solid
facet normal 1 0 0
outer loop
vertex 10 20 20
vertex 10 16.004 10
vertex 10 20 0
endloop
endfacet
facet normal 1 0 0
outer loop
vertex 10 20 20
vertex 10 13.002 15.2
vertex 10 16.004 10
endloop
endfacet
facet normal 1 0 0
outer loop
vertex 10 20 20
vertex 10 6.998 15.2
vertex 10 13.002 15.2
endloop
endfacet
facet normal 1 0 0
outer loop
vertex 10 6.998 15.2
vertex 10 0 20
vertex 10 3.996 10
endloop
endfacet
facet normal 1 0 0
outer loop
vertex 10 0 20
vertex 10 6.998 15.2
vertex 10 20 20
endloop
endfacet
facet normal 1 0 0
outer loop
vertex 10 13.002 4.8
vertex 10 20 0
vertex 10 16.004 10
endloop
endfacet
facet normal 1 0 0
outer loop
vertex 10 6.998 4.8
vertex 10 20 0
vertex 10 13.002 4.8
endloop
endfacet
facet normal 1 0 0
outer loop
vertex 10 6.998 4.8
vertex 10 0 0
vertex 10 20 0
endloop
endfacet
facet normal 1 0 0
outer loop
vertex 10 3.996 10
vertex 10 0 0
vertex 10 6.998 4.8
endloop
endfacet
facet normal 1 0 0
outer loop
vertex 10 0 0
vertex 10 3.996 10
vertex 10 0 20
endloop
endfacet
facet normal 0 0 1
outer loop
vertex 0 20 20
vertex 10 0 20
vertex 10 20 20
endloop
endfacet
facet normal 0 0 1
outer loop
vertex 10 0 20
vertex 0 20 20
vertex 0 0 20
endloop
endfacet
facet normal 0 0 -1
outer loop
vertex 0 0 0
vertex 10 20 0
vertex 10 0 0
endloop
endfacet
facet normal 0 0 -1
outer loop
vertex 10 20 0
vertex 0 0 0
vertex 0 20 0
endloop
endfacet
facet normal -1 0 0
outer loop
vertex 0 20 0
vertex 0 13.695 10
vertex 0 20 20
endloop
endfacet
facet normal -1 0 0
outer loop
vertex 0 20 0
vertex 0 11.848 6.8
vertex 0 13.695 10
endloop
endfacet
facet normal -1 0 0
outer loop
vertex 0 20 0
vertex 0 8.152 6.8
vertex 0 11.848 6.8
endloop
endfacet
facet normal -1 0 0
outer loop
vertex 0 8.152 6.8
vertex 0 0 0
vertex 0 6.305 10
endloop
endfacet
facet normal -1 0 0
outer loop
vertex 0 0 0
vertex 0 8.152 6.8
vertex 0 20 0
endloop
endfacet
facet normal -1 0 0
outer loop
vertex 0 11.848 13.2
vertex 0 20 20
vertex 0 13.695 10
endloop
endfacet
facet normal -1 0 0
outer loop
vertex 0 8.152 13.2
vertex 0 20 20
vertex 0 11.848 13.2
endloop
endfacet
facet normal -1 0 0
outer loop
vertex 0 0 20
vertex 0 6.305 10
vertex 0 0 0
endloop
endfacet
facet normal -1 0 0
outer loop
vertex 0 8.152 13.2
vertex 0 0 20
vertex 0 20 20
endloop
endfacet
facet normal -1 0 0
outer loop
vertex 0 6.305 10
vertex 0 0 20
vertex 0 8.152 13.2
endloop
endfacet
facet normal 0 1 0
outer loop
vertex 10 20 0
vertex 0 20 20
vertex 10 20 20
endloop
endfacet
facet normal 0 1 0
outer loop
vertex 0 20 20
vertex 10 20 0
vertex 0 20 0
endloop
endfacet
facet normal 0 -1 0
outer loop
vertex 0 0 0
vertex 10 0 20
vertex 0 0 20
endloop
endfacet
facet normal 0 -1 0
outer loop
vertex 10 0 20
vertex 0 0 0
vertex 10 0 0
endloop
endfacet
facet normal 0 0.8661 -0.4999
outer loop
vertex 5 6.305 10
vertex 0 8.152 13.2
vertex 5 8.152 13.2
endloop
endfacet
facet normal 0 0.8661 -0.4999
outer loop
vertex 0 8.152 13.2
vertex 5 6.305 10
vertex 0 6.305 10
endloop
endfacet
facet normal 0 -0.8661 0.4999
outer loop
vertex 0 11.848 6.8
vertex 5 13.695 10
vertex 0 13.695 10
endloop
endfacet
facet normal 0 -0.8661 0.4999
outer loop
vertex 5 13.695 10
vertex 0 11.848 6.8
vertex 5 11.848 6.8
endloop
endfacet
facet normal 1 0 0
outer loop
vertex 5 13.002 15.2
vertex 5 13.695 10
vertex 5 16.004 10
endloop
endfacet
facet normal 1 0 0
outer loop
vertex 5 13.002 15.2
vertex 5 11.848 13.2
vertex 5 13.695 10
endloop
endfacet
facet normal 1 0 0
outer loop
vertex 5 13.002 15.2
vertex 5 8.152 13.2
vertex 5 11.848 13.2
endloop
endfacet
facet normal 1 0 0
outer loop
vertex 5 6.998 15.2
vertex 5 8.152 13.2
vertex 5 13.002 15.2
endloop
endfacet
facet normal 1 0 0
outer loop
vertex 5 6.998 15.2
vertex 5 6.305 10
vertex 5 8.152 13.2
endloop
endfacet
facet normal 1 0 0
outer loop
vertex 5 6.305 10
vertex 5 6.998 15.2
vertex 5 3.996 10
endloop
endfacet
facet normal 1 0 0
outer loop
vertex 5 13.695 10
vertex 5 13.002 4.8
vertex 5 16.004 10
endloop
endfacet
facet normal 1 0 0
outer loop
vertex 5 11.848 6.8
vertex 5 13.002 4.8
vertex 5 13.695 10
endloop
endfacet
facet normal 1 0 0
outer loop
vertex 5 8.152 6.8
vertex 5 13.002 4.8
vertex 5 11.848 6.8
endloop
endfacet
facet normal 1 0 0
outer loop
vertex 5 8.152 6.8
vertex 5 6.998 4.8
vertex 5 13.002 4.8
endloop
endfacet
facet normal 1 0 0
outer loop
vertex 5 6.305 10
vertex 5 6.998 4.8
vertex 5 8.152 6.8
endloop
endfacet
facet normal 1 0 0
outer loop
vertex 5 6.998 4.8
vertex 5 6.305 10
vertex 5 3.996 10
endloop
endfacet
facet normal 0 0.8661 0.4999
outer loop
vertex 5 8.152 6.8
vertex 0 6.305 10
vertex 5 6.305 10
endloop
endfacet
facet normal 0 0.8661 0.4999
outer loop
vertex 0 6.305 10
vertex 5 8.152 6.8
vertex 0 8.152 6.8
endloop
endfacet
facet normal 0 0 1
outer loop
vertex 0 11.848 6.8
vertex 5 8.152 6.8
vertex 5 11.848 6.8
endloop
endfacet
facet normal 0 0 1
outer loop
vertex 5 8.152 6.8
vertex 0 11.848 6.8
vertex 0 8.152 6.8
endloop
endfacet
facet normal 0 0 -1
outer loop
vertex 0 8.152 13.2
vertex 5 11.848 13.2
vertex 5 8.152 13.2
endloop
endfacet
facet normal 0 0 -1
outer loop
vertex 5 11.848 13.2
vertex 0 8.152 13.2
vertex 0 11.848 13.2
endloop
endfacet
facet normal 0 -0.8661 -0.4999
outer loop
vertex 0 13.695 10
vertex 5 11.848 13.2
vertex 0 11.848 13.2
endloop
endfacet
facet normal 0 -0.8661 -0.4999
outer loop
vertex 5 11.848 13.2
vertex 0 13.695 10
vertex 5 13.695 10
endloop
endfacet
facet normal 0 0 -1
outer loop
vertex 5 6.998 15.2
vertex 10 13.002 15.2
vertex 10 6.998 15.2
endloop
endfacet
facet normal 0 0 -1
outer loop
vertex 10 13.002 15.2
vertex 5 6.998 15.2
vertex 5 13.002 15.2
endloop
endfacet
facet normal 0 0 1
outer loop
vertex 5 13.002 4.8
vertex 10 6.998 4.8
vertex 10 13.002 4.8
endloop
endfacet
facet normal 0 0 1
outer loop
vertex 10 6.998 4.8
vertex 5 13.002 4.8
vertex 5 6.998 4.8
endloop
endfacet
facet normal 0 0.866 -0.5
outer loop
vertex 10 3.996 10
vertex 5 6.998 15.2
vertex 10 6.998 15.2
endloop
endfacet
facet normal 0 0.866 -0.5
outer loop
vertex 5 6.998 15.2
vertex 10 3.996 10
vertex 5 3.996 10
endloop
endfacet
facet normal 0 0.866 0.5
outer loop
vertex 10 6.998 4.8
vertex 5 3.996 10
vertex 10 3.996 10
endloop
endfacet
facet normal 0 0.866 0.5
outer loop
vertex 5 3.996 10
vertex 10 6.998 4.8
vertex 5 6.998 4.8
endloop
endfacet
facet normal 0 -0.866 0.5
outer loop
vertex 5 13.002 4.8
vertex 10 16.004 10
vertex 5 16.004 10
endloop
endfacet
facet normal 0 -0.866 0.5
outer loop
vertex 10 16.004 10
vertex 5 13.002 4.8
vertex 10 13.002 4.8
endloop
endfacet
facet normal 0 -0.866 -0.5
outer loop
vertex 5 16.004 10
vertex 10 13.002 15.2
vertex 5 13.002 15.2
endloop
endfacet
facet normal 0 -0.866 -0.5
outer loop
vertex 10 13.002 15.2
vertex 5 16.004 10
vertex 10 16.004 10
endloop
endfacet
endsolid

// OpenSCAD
// file: ../../../modules/steel_rack.scad
use <bolts.scad>;

bolt_edge_offset = 15;
bolt_positions = [
  bolt_edge_offset,
  bolt_edge_offset + 98,
  bolt_edge_offset + 98 + 24,
];

module bolt_and_nut(y, h) {
  nut_thickness = 5;
  translate([0, y, h / 2])
    m6_bolt_hole(h + 1, center = true);
  translate([0, y, h - nut_thickness / 2])
    rotate([0, 0, 90])
    m6_nut_trap(nut_thickness, center = true);
}

module long_bar(w, y, h) {
  difference() {
    translate([w / 2, y / 2, h / 2])
      cube([w, y, h], center = true);

    for (x = bolt_positions) {
      translate([x, 0, 0])
        bolt_and_nut(y / 2, h);
    }
  }
}

module short_bar(w, y, h) {
  difference() {
    translate([w / 2, y / 2, h / 2])
      cube([w, y, h], center = true);

    translate([bolt_positions[0], 0, 0])
      bolt_and_nut(y / 2, h);
  }
}

module fillet_profile(r, h) {
  linear_extrude(height = h, center = true)
    difference() {
      square([r, r]);
      circle(r = r, $fn = 64);
    }
}
// file: ../../../modules/bolts.scad
module nut_trap(d, h, center = true) {
  linear_extrude(height = h, center = center)
  circle(d = d / cos(30), $fn = 6);
}

module bolt_hole(d, h, center = true) {
  linear_extrude(height = h, center = center)
  circle(d = d, $fn = 64);
}

// Hex holes for self-tapping (nominal - 0.2mm)
module hex_hole(flat_d, h) {
  linear_extrude(height = h, center = true)
  circle(d = flat_d / cos(30), $fn = 6);
}

module m3_bolt_hexhole(h) {
  rotate([0, 0, 90]) hex_hole(flat_d = 2.8, h = h);
}

module m4_bolt_hexhole(h) {
  rotate([0, 0, 90]) hex_hole(flat_d = 3.8, h = h);
}

module m6_bolt_hexhole(h) {
  rotate([0, 0, 90]) hex_hole(flat_d = 5.8, h = h);
}

module m8_bolt_hexhole(h) {
  rotate([0, 0, 90]) hex_hole(flat_d = 7.8, h = h);
}

// M3
module m3_bolt_hole(h, center = false) { bolt_hole(d = 3.4, h = h, center = center); }
module m3_nut_trap(h, center = false) { nut_trap(d = 5.7, h = h, center = center); }

// M4
module m4_bolt_hole(h, center = false) { bolt_hole(d = 4.4, h = h, center = center); }
module m4_nut_trap(h, center = false) { nut_trap(d = 7.5, h = h, center = center); }

// M6
module m6_bolt_hole(h, center = false) { bolt_hole(d = 6.2, h = h, center = center); }
module m6_nut_trap(h, center = false) { nut_trap(d = 10.2, h = h, center = center); }

// M8
module m8_bolt_hole(h, center = false) { bolt_hole(d = 8.4, h = h, center = center); }
module m8_nut_trap(h, center = false) { nut_trap(d = 13.3, h = h, center = center); }
// file: ../../../modules/slide_rail_outer_bracket.scad
use <bolts.scad>
use <steel_rack.scad>

// スライドレール外側とL字アングルを接合するL字ブラケット。
// 設計の経緯と確定値は ledger/designs/steel-rack-500x400.md が正本。
//
// 座標系 (部品自身の datum):
//   X = 0 がこの部品側のL字アングル外側面。部品はアングル板厚の内側から始まる
//   Y = 0 がスライドレール外側面。+Y がラック外側
//   Z = 0 が部品底面 (レール下端と一致)
// front は screw_x = [37, 101.5]、rear は [76.5, 172.5] を自分の datum
// から渡す。 M6 が高さ 22.5±12 の対称配置のため部品は Z 反転対称になり、
// 左右のレールにも上下反転するだけで同じ2部品を使い回せる。

bracket_height = 45;
flange_t = 10;
inner_r = 4;
m6_z = [ 10.5, 34.5 ];
// クリアランス基準: 呼び寸法 + 0.4mm (実プリントの嵌合結果から拡大)
m6_pass_flat = 6.4; // M6ボルト通し六角の二面幅 (手前5mm)
m6_nut_flat = 10.4; // M6ナット窪み六角の二面幅 (奥5mm、ナット実測10.0)
m6_stage_depth = 5;
screw_z = 22.5;
m4_pass_flat = 4.4; // M4小トラスネジ通し六角の二面幅
m4_nut_flat = 7.4; // M4ナット窪み六角の二面幅 (JIS規格7.0 + 0.4、実測は未)
m4_nut_depth = 2.8; // M4ナット窪みの深さ (user指定)
edge_margin = 8; // 穴の外縁から部品端までの余白 (自由な辺のみ)
angle_t = 2.2; // L字アングルの板厚

// 六角プリズム: 軸X・上下の辺が水平 (flat-up)。
// 天井を短い水平ブリッジにして垂れの改善を狙う
// (point-up だと天井面が水平から30°になり垂れた — 嵌合試験で確認済み)
module
hex_x_flat_up(flat_d, l)
{
    rotate([ 0, 90, 0 ]) rotate([ 0, 0, 90 ]) hex_hole(flat_d = flat_d, h = l);
}

// 六角プリズム: 軸Y・上下の辺が水平 (flat-up)。M6と同じくブリッジ天井
module
hex_y_flat_up(flat_d, l)
{
    rotate([ 90, 0, 0 ]) hex_hole(flat_d = flat_d, h = l);
}

module
slide_rail_outer_bracket(screw_x, name = "bracket")
{
    // flat-up配置では水平方向の穴半径は対角/2 (= 二面幅/(2*cos30))。
    // 8mm余白の契約はこの実半径に対して守る
    m6_nut_diag = m6_nut_flat / cos(30);
    m4_nut_diag = m4_nut_flat / cos(30);
    // 短辺のY寸法: 長辺厚 + 内側R + 余白 + M6六角(対角) + 余白
    m6_y = flange_t + inner_r + edge_margin + m6_nut_diag / 2;
    short_len = m6_y + m6_nut_diag / 2 + edge_margin;
    // 長辺のX終端: 最奥のM4穴の最大断面 (ナット窪みの対角の半分) + 余白
    arm_end = max(screw_x) + m4_nut_diag / 2 + edge_margin;

    echo(str("CONTRACT ", name, ": height = ", bracket_height));
    echo(str("CONTRACT ", name, ": flange_t = ", flange_t));
    echo(str("CONTRACT ", name, ": inner_r = ", inner_r));
    echo(str("CONTRACT ", name, ": m6_z = ", m6_z));
    echo(str("CONTRACT ", name, ": m6_pass_flat = ", m6_pass_flat));
    echo(str("CONTRACT ", name, ": m6_nut_flat = ", m6_nut_flat));
    echo(str("CONTRACT ", name, ": screw_z = ", screw_z));
    echo(str("CONTRACT ", name, ": m4_pass_flat = ", m4_pass_flat));
    echo(str("CONTRACT ", name, ": m4_nut_flat = ", m4_nut_flat));
    echo(str("CONTRACT ", name, ": m4_nut_depth = ", m4_nut_depth));
    echo(str("CONTRACT ", name, ": edge_margin = ", edge_margin));
    echo(str("CONTRACT ", name, ": angle_t = ", angle_t));
    echo(str("CONTRACT ", name, ": screw_x = ", screw_x));
    echo(str("CONTRACT ",
             name,
             ": m6_y = ",
             m6_y,
             ", short_len = ",
             short_len,
             ", arm_end = ",
             arm_end));

    // 余白の契約 (自由な辺のみ。高さ45とM6のZはuser固定値なので対象外)
    assert(m6_y - m6_nut_diag / 2 - (flange_t + inner_r) >= edge_margin,
           "M6 hole too close to the inner corner");
    assert(short_len - (m6_y + m6_nut_diag / 2) >= edge_margin,
           "M6 hole too close to the short-flange edge");
    assert(arm_end - (max(screw_x) + m4_nut_diag / 2) >= edge_margin,
           "M4 hole too close to the arm end");
    assert(min(screw_x) - m4_nut_diag / 2 >= angle_t + flange_t,
           "M4 hole overlaps the short flange");

    difference()
    {
        union()
        {
            // 短辺: アングル内側に当たる縦板 (M6で締結)
            translate([ angle_t, 0, 0 ])
                cube([ flange_t, short_len, bracket_height ]);

            // 長辺: レール外側面に当たる横板 (M4小トラスネジ+ナットで締結)
            translate([ angle_t, 0, 0 ])
                cube([ arm_end - angle_t, flange_t, bracket_height ]);

            // 内側コーナーのR4フィレット (応力集中の回避)
            translate([
                angle_t + flange_t + inner_r,
                flange_t + inner_r,
                bracket_height / 2
            ]) rotate([ 0, 0, 180 ]) fillet_profile(inner_r, bracket_height);
        }

        // M6の2段六角穴 (軸X・flat-up): 手前5mmが通し、奥5mmがナット窪み
        for (z = m6_z) {
            translate([ angle_t + m6_stage_depth / 2 - 0.05, m6_y, z ])
                hex_x_flat_up(m6_pass_flat, m6_stage_depth + 0.1);
            translate(
                [ angle_t + flange_t - m6_stage_depth / 2 + 0.05, m6_y, z ])
                hex_x_flat_up(m6_nut_flat, m6_stage_depth + 0.1);
        }

        // M4小トラスネジの穴 (軸Y・flat-up):
        // 通しは全厚を貫通し、L字の内側面 (y=10) から深さ2.8mmのナット窪み。
        // ネジはレール内側から刺さり
        // (トラス頭はスライダーと干渉しない実測済み)、
        // ナットが窪みの底で受けてレール板とブラケットを共締めする
        for (x = screw_x) {
            translate([ x, flange_t / 2, screw_z ])
                hex_y_flat_up(m4_pass_flat, flange_t + 0.2);
            translate([ x, flange_t - m4_nut_depth / 2 + 0.05, screw_z ])
                hex_y_flat_up(m4_nut_flat, m4_nut_depth + 0.1);
        }
    }
}
// main file
use <../../../modules/slide_rail_outer_bracket.scad>

// M6の2段六角穴の嵌合試験片。
// クリアランス基準+0.4mm (通し6.4 / ナット窪み10.4) で検証する。
// 実部品と同じ hex_x_flat_up を使い、同じ印刷向き (穴軸が水平・上辺ブリッジ)。
// 確認点: M6x12ボルトが通しへ滑って入るか、ナットが窪みへガッチリ収まるか。

width = 20;
height = 20;
thickness = 10;
pass_flat = 6.4; // 二面幅6.0 + 0.4
nut_flat = 10.4; // 二面幅10.0 + 0.4
stage_depth = 5;

difference()
{
    cube([ thickness, width, height ]);

    // 手前5mm: ボルト通し
    translate([ stage_depth / 2 - 0.05, width / 2, height / 2 ])
        hex_x_flat_up(pass_flat, stage_depth + 0.1);

    // 奥5mm: ナット窪み
    translate([ thickness - stage_depth / 2 + 0.05, width / 2, height / 2 ])
        hex_x_flat_up(nut_flat, stage_depth + 0.1);
}
